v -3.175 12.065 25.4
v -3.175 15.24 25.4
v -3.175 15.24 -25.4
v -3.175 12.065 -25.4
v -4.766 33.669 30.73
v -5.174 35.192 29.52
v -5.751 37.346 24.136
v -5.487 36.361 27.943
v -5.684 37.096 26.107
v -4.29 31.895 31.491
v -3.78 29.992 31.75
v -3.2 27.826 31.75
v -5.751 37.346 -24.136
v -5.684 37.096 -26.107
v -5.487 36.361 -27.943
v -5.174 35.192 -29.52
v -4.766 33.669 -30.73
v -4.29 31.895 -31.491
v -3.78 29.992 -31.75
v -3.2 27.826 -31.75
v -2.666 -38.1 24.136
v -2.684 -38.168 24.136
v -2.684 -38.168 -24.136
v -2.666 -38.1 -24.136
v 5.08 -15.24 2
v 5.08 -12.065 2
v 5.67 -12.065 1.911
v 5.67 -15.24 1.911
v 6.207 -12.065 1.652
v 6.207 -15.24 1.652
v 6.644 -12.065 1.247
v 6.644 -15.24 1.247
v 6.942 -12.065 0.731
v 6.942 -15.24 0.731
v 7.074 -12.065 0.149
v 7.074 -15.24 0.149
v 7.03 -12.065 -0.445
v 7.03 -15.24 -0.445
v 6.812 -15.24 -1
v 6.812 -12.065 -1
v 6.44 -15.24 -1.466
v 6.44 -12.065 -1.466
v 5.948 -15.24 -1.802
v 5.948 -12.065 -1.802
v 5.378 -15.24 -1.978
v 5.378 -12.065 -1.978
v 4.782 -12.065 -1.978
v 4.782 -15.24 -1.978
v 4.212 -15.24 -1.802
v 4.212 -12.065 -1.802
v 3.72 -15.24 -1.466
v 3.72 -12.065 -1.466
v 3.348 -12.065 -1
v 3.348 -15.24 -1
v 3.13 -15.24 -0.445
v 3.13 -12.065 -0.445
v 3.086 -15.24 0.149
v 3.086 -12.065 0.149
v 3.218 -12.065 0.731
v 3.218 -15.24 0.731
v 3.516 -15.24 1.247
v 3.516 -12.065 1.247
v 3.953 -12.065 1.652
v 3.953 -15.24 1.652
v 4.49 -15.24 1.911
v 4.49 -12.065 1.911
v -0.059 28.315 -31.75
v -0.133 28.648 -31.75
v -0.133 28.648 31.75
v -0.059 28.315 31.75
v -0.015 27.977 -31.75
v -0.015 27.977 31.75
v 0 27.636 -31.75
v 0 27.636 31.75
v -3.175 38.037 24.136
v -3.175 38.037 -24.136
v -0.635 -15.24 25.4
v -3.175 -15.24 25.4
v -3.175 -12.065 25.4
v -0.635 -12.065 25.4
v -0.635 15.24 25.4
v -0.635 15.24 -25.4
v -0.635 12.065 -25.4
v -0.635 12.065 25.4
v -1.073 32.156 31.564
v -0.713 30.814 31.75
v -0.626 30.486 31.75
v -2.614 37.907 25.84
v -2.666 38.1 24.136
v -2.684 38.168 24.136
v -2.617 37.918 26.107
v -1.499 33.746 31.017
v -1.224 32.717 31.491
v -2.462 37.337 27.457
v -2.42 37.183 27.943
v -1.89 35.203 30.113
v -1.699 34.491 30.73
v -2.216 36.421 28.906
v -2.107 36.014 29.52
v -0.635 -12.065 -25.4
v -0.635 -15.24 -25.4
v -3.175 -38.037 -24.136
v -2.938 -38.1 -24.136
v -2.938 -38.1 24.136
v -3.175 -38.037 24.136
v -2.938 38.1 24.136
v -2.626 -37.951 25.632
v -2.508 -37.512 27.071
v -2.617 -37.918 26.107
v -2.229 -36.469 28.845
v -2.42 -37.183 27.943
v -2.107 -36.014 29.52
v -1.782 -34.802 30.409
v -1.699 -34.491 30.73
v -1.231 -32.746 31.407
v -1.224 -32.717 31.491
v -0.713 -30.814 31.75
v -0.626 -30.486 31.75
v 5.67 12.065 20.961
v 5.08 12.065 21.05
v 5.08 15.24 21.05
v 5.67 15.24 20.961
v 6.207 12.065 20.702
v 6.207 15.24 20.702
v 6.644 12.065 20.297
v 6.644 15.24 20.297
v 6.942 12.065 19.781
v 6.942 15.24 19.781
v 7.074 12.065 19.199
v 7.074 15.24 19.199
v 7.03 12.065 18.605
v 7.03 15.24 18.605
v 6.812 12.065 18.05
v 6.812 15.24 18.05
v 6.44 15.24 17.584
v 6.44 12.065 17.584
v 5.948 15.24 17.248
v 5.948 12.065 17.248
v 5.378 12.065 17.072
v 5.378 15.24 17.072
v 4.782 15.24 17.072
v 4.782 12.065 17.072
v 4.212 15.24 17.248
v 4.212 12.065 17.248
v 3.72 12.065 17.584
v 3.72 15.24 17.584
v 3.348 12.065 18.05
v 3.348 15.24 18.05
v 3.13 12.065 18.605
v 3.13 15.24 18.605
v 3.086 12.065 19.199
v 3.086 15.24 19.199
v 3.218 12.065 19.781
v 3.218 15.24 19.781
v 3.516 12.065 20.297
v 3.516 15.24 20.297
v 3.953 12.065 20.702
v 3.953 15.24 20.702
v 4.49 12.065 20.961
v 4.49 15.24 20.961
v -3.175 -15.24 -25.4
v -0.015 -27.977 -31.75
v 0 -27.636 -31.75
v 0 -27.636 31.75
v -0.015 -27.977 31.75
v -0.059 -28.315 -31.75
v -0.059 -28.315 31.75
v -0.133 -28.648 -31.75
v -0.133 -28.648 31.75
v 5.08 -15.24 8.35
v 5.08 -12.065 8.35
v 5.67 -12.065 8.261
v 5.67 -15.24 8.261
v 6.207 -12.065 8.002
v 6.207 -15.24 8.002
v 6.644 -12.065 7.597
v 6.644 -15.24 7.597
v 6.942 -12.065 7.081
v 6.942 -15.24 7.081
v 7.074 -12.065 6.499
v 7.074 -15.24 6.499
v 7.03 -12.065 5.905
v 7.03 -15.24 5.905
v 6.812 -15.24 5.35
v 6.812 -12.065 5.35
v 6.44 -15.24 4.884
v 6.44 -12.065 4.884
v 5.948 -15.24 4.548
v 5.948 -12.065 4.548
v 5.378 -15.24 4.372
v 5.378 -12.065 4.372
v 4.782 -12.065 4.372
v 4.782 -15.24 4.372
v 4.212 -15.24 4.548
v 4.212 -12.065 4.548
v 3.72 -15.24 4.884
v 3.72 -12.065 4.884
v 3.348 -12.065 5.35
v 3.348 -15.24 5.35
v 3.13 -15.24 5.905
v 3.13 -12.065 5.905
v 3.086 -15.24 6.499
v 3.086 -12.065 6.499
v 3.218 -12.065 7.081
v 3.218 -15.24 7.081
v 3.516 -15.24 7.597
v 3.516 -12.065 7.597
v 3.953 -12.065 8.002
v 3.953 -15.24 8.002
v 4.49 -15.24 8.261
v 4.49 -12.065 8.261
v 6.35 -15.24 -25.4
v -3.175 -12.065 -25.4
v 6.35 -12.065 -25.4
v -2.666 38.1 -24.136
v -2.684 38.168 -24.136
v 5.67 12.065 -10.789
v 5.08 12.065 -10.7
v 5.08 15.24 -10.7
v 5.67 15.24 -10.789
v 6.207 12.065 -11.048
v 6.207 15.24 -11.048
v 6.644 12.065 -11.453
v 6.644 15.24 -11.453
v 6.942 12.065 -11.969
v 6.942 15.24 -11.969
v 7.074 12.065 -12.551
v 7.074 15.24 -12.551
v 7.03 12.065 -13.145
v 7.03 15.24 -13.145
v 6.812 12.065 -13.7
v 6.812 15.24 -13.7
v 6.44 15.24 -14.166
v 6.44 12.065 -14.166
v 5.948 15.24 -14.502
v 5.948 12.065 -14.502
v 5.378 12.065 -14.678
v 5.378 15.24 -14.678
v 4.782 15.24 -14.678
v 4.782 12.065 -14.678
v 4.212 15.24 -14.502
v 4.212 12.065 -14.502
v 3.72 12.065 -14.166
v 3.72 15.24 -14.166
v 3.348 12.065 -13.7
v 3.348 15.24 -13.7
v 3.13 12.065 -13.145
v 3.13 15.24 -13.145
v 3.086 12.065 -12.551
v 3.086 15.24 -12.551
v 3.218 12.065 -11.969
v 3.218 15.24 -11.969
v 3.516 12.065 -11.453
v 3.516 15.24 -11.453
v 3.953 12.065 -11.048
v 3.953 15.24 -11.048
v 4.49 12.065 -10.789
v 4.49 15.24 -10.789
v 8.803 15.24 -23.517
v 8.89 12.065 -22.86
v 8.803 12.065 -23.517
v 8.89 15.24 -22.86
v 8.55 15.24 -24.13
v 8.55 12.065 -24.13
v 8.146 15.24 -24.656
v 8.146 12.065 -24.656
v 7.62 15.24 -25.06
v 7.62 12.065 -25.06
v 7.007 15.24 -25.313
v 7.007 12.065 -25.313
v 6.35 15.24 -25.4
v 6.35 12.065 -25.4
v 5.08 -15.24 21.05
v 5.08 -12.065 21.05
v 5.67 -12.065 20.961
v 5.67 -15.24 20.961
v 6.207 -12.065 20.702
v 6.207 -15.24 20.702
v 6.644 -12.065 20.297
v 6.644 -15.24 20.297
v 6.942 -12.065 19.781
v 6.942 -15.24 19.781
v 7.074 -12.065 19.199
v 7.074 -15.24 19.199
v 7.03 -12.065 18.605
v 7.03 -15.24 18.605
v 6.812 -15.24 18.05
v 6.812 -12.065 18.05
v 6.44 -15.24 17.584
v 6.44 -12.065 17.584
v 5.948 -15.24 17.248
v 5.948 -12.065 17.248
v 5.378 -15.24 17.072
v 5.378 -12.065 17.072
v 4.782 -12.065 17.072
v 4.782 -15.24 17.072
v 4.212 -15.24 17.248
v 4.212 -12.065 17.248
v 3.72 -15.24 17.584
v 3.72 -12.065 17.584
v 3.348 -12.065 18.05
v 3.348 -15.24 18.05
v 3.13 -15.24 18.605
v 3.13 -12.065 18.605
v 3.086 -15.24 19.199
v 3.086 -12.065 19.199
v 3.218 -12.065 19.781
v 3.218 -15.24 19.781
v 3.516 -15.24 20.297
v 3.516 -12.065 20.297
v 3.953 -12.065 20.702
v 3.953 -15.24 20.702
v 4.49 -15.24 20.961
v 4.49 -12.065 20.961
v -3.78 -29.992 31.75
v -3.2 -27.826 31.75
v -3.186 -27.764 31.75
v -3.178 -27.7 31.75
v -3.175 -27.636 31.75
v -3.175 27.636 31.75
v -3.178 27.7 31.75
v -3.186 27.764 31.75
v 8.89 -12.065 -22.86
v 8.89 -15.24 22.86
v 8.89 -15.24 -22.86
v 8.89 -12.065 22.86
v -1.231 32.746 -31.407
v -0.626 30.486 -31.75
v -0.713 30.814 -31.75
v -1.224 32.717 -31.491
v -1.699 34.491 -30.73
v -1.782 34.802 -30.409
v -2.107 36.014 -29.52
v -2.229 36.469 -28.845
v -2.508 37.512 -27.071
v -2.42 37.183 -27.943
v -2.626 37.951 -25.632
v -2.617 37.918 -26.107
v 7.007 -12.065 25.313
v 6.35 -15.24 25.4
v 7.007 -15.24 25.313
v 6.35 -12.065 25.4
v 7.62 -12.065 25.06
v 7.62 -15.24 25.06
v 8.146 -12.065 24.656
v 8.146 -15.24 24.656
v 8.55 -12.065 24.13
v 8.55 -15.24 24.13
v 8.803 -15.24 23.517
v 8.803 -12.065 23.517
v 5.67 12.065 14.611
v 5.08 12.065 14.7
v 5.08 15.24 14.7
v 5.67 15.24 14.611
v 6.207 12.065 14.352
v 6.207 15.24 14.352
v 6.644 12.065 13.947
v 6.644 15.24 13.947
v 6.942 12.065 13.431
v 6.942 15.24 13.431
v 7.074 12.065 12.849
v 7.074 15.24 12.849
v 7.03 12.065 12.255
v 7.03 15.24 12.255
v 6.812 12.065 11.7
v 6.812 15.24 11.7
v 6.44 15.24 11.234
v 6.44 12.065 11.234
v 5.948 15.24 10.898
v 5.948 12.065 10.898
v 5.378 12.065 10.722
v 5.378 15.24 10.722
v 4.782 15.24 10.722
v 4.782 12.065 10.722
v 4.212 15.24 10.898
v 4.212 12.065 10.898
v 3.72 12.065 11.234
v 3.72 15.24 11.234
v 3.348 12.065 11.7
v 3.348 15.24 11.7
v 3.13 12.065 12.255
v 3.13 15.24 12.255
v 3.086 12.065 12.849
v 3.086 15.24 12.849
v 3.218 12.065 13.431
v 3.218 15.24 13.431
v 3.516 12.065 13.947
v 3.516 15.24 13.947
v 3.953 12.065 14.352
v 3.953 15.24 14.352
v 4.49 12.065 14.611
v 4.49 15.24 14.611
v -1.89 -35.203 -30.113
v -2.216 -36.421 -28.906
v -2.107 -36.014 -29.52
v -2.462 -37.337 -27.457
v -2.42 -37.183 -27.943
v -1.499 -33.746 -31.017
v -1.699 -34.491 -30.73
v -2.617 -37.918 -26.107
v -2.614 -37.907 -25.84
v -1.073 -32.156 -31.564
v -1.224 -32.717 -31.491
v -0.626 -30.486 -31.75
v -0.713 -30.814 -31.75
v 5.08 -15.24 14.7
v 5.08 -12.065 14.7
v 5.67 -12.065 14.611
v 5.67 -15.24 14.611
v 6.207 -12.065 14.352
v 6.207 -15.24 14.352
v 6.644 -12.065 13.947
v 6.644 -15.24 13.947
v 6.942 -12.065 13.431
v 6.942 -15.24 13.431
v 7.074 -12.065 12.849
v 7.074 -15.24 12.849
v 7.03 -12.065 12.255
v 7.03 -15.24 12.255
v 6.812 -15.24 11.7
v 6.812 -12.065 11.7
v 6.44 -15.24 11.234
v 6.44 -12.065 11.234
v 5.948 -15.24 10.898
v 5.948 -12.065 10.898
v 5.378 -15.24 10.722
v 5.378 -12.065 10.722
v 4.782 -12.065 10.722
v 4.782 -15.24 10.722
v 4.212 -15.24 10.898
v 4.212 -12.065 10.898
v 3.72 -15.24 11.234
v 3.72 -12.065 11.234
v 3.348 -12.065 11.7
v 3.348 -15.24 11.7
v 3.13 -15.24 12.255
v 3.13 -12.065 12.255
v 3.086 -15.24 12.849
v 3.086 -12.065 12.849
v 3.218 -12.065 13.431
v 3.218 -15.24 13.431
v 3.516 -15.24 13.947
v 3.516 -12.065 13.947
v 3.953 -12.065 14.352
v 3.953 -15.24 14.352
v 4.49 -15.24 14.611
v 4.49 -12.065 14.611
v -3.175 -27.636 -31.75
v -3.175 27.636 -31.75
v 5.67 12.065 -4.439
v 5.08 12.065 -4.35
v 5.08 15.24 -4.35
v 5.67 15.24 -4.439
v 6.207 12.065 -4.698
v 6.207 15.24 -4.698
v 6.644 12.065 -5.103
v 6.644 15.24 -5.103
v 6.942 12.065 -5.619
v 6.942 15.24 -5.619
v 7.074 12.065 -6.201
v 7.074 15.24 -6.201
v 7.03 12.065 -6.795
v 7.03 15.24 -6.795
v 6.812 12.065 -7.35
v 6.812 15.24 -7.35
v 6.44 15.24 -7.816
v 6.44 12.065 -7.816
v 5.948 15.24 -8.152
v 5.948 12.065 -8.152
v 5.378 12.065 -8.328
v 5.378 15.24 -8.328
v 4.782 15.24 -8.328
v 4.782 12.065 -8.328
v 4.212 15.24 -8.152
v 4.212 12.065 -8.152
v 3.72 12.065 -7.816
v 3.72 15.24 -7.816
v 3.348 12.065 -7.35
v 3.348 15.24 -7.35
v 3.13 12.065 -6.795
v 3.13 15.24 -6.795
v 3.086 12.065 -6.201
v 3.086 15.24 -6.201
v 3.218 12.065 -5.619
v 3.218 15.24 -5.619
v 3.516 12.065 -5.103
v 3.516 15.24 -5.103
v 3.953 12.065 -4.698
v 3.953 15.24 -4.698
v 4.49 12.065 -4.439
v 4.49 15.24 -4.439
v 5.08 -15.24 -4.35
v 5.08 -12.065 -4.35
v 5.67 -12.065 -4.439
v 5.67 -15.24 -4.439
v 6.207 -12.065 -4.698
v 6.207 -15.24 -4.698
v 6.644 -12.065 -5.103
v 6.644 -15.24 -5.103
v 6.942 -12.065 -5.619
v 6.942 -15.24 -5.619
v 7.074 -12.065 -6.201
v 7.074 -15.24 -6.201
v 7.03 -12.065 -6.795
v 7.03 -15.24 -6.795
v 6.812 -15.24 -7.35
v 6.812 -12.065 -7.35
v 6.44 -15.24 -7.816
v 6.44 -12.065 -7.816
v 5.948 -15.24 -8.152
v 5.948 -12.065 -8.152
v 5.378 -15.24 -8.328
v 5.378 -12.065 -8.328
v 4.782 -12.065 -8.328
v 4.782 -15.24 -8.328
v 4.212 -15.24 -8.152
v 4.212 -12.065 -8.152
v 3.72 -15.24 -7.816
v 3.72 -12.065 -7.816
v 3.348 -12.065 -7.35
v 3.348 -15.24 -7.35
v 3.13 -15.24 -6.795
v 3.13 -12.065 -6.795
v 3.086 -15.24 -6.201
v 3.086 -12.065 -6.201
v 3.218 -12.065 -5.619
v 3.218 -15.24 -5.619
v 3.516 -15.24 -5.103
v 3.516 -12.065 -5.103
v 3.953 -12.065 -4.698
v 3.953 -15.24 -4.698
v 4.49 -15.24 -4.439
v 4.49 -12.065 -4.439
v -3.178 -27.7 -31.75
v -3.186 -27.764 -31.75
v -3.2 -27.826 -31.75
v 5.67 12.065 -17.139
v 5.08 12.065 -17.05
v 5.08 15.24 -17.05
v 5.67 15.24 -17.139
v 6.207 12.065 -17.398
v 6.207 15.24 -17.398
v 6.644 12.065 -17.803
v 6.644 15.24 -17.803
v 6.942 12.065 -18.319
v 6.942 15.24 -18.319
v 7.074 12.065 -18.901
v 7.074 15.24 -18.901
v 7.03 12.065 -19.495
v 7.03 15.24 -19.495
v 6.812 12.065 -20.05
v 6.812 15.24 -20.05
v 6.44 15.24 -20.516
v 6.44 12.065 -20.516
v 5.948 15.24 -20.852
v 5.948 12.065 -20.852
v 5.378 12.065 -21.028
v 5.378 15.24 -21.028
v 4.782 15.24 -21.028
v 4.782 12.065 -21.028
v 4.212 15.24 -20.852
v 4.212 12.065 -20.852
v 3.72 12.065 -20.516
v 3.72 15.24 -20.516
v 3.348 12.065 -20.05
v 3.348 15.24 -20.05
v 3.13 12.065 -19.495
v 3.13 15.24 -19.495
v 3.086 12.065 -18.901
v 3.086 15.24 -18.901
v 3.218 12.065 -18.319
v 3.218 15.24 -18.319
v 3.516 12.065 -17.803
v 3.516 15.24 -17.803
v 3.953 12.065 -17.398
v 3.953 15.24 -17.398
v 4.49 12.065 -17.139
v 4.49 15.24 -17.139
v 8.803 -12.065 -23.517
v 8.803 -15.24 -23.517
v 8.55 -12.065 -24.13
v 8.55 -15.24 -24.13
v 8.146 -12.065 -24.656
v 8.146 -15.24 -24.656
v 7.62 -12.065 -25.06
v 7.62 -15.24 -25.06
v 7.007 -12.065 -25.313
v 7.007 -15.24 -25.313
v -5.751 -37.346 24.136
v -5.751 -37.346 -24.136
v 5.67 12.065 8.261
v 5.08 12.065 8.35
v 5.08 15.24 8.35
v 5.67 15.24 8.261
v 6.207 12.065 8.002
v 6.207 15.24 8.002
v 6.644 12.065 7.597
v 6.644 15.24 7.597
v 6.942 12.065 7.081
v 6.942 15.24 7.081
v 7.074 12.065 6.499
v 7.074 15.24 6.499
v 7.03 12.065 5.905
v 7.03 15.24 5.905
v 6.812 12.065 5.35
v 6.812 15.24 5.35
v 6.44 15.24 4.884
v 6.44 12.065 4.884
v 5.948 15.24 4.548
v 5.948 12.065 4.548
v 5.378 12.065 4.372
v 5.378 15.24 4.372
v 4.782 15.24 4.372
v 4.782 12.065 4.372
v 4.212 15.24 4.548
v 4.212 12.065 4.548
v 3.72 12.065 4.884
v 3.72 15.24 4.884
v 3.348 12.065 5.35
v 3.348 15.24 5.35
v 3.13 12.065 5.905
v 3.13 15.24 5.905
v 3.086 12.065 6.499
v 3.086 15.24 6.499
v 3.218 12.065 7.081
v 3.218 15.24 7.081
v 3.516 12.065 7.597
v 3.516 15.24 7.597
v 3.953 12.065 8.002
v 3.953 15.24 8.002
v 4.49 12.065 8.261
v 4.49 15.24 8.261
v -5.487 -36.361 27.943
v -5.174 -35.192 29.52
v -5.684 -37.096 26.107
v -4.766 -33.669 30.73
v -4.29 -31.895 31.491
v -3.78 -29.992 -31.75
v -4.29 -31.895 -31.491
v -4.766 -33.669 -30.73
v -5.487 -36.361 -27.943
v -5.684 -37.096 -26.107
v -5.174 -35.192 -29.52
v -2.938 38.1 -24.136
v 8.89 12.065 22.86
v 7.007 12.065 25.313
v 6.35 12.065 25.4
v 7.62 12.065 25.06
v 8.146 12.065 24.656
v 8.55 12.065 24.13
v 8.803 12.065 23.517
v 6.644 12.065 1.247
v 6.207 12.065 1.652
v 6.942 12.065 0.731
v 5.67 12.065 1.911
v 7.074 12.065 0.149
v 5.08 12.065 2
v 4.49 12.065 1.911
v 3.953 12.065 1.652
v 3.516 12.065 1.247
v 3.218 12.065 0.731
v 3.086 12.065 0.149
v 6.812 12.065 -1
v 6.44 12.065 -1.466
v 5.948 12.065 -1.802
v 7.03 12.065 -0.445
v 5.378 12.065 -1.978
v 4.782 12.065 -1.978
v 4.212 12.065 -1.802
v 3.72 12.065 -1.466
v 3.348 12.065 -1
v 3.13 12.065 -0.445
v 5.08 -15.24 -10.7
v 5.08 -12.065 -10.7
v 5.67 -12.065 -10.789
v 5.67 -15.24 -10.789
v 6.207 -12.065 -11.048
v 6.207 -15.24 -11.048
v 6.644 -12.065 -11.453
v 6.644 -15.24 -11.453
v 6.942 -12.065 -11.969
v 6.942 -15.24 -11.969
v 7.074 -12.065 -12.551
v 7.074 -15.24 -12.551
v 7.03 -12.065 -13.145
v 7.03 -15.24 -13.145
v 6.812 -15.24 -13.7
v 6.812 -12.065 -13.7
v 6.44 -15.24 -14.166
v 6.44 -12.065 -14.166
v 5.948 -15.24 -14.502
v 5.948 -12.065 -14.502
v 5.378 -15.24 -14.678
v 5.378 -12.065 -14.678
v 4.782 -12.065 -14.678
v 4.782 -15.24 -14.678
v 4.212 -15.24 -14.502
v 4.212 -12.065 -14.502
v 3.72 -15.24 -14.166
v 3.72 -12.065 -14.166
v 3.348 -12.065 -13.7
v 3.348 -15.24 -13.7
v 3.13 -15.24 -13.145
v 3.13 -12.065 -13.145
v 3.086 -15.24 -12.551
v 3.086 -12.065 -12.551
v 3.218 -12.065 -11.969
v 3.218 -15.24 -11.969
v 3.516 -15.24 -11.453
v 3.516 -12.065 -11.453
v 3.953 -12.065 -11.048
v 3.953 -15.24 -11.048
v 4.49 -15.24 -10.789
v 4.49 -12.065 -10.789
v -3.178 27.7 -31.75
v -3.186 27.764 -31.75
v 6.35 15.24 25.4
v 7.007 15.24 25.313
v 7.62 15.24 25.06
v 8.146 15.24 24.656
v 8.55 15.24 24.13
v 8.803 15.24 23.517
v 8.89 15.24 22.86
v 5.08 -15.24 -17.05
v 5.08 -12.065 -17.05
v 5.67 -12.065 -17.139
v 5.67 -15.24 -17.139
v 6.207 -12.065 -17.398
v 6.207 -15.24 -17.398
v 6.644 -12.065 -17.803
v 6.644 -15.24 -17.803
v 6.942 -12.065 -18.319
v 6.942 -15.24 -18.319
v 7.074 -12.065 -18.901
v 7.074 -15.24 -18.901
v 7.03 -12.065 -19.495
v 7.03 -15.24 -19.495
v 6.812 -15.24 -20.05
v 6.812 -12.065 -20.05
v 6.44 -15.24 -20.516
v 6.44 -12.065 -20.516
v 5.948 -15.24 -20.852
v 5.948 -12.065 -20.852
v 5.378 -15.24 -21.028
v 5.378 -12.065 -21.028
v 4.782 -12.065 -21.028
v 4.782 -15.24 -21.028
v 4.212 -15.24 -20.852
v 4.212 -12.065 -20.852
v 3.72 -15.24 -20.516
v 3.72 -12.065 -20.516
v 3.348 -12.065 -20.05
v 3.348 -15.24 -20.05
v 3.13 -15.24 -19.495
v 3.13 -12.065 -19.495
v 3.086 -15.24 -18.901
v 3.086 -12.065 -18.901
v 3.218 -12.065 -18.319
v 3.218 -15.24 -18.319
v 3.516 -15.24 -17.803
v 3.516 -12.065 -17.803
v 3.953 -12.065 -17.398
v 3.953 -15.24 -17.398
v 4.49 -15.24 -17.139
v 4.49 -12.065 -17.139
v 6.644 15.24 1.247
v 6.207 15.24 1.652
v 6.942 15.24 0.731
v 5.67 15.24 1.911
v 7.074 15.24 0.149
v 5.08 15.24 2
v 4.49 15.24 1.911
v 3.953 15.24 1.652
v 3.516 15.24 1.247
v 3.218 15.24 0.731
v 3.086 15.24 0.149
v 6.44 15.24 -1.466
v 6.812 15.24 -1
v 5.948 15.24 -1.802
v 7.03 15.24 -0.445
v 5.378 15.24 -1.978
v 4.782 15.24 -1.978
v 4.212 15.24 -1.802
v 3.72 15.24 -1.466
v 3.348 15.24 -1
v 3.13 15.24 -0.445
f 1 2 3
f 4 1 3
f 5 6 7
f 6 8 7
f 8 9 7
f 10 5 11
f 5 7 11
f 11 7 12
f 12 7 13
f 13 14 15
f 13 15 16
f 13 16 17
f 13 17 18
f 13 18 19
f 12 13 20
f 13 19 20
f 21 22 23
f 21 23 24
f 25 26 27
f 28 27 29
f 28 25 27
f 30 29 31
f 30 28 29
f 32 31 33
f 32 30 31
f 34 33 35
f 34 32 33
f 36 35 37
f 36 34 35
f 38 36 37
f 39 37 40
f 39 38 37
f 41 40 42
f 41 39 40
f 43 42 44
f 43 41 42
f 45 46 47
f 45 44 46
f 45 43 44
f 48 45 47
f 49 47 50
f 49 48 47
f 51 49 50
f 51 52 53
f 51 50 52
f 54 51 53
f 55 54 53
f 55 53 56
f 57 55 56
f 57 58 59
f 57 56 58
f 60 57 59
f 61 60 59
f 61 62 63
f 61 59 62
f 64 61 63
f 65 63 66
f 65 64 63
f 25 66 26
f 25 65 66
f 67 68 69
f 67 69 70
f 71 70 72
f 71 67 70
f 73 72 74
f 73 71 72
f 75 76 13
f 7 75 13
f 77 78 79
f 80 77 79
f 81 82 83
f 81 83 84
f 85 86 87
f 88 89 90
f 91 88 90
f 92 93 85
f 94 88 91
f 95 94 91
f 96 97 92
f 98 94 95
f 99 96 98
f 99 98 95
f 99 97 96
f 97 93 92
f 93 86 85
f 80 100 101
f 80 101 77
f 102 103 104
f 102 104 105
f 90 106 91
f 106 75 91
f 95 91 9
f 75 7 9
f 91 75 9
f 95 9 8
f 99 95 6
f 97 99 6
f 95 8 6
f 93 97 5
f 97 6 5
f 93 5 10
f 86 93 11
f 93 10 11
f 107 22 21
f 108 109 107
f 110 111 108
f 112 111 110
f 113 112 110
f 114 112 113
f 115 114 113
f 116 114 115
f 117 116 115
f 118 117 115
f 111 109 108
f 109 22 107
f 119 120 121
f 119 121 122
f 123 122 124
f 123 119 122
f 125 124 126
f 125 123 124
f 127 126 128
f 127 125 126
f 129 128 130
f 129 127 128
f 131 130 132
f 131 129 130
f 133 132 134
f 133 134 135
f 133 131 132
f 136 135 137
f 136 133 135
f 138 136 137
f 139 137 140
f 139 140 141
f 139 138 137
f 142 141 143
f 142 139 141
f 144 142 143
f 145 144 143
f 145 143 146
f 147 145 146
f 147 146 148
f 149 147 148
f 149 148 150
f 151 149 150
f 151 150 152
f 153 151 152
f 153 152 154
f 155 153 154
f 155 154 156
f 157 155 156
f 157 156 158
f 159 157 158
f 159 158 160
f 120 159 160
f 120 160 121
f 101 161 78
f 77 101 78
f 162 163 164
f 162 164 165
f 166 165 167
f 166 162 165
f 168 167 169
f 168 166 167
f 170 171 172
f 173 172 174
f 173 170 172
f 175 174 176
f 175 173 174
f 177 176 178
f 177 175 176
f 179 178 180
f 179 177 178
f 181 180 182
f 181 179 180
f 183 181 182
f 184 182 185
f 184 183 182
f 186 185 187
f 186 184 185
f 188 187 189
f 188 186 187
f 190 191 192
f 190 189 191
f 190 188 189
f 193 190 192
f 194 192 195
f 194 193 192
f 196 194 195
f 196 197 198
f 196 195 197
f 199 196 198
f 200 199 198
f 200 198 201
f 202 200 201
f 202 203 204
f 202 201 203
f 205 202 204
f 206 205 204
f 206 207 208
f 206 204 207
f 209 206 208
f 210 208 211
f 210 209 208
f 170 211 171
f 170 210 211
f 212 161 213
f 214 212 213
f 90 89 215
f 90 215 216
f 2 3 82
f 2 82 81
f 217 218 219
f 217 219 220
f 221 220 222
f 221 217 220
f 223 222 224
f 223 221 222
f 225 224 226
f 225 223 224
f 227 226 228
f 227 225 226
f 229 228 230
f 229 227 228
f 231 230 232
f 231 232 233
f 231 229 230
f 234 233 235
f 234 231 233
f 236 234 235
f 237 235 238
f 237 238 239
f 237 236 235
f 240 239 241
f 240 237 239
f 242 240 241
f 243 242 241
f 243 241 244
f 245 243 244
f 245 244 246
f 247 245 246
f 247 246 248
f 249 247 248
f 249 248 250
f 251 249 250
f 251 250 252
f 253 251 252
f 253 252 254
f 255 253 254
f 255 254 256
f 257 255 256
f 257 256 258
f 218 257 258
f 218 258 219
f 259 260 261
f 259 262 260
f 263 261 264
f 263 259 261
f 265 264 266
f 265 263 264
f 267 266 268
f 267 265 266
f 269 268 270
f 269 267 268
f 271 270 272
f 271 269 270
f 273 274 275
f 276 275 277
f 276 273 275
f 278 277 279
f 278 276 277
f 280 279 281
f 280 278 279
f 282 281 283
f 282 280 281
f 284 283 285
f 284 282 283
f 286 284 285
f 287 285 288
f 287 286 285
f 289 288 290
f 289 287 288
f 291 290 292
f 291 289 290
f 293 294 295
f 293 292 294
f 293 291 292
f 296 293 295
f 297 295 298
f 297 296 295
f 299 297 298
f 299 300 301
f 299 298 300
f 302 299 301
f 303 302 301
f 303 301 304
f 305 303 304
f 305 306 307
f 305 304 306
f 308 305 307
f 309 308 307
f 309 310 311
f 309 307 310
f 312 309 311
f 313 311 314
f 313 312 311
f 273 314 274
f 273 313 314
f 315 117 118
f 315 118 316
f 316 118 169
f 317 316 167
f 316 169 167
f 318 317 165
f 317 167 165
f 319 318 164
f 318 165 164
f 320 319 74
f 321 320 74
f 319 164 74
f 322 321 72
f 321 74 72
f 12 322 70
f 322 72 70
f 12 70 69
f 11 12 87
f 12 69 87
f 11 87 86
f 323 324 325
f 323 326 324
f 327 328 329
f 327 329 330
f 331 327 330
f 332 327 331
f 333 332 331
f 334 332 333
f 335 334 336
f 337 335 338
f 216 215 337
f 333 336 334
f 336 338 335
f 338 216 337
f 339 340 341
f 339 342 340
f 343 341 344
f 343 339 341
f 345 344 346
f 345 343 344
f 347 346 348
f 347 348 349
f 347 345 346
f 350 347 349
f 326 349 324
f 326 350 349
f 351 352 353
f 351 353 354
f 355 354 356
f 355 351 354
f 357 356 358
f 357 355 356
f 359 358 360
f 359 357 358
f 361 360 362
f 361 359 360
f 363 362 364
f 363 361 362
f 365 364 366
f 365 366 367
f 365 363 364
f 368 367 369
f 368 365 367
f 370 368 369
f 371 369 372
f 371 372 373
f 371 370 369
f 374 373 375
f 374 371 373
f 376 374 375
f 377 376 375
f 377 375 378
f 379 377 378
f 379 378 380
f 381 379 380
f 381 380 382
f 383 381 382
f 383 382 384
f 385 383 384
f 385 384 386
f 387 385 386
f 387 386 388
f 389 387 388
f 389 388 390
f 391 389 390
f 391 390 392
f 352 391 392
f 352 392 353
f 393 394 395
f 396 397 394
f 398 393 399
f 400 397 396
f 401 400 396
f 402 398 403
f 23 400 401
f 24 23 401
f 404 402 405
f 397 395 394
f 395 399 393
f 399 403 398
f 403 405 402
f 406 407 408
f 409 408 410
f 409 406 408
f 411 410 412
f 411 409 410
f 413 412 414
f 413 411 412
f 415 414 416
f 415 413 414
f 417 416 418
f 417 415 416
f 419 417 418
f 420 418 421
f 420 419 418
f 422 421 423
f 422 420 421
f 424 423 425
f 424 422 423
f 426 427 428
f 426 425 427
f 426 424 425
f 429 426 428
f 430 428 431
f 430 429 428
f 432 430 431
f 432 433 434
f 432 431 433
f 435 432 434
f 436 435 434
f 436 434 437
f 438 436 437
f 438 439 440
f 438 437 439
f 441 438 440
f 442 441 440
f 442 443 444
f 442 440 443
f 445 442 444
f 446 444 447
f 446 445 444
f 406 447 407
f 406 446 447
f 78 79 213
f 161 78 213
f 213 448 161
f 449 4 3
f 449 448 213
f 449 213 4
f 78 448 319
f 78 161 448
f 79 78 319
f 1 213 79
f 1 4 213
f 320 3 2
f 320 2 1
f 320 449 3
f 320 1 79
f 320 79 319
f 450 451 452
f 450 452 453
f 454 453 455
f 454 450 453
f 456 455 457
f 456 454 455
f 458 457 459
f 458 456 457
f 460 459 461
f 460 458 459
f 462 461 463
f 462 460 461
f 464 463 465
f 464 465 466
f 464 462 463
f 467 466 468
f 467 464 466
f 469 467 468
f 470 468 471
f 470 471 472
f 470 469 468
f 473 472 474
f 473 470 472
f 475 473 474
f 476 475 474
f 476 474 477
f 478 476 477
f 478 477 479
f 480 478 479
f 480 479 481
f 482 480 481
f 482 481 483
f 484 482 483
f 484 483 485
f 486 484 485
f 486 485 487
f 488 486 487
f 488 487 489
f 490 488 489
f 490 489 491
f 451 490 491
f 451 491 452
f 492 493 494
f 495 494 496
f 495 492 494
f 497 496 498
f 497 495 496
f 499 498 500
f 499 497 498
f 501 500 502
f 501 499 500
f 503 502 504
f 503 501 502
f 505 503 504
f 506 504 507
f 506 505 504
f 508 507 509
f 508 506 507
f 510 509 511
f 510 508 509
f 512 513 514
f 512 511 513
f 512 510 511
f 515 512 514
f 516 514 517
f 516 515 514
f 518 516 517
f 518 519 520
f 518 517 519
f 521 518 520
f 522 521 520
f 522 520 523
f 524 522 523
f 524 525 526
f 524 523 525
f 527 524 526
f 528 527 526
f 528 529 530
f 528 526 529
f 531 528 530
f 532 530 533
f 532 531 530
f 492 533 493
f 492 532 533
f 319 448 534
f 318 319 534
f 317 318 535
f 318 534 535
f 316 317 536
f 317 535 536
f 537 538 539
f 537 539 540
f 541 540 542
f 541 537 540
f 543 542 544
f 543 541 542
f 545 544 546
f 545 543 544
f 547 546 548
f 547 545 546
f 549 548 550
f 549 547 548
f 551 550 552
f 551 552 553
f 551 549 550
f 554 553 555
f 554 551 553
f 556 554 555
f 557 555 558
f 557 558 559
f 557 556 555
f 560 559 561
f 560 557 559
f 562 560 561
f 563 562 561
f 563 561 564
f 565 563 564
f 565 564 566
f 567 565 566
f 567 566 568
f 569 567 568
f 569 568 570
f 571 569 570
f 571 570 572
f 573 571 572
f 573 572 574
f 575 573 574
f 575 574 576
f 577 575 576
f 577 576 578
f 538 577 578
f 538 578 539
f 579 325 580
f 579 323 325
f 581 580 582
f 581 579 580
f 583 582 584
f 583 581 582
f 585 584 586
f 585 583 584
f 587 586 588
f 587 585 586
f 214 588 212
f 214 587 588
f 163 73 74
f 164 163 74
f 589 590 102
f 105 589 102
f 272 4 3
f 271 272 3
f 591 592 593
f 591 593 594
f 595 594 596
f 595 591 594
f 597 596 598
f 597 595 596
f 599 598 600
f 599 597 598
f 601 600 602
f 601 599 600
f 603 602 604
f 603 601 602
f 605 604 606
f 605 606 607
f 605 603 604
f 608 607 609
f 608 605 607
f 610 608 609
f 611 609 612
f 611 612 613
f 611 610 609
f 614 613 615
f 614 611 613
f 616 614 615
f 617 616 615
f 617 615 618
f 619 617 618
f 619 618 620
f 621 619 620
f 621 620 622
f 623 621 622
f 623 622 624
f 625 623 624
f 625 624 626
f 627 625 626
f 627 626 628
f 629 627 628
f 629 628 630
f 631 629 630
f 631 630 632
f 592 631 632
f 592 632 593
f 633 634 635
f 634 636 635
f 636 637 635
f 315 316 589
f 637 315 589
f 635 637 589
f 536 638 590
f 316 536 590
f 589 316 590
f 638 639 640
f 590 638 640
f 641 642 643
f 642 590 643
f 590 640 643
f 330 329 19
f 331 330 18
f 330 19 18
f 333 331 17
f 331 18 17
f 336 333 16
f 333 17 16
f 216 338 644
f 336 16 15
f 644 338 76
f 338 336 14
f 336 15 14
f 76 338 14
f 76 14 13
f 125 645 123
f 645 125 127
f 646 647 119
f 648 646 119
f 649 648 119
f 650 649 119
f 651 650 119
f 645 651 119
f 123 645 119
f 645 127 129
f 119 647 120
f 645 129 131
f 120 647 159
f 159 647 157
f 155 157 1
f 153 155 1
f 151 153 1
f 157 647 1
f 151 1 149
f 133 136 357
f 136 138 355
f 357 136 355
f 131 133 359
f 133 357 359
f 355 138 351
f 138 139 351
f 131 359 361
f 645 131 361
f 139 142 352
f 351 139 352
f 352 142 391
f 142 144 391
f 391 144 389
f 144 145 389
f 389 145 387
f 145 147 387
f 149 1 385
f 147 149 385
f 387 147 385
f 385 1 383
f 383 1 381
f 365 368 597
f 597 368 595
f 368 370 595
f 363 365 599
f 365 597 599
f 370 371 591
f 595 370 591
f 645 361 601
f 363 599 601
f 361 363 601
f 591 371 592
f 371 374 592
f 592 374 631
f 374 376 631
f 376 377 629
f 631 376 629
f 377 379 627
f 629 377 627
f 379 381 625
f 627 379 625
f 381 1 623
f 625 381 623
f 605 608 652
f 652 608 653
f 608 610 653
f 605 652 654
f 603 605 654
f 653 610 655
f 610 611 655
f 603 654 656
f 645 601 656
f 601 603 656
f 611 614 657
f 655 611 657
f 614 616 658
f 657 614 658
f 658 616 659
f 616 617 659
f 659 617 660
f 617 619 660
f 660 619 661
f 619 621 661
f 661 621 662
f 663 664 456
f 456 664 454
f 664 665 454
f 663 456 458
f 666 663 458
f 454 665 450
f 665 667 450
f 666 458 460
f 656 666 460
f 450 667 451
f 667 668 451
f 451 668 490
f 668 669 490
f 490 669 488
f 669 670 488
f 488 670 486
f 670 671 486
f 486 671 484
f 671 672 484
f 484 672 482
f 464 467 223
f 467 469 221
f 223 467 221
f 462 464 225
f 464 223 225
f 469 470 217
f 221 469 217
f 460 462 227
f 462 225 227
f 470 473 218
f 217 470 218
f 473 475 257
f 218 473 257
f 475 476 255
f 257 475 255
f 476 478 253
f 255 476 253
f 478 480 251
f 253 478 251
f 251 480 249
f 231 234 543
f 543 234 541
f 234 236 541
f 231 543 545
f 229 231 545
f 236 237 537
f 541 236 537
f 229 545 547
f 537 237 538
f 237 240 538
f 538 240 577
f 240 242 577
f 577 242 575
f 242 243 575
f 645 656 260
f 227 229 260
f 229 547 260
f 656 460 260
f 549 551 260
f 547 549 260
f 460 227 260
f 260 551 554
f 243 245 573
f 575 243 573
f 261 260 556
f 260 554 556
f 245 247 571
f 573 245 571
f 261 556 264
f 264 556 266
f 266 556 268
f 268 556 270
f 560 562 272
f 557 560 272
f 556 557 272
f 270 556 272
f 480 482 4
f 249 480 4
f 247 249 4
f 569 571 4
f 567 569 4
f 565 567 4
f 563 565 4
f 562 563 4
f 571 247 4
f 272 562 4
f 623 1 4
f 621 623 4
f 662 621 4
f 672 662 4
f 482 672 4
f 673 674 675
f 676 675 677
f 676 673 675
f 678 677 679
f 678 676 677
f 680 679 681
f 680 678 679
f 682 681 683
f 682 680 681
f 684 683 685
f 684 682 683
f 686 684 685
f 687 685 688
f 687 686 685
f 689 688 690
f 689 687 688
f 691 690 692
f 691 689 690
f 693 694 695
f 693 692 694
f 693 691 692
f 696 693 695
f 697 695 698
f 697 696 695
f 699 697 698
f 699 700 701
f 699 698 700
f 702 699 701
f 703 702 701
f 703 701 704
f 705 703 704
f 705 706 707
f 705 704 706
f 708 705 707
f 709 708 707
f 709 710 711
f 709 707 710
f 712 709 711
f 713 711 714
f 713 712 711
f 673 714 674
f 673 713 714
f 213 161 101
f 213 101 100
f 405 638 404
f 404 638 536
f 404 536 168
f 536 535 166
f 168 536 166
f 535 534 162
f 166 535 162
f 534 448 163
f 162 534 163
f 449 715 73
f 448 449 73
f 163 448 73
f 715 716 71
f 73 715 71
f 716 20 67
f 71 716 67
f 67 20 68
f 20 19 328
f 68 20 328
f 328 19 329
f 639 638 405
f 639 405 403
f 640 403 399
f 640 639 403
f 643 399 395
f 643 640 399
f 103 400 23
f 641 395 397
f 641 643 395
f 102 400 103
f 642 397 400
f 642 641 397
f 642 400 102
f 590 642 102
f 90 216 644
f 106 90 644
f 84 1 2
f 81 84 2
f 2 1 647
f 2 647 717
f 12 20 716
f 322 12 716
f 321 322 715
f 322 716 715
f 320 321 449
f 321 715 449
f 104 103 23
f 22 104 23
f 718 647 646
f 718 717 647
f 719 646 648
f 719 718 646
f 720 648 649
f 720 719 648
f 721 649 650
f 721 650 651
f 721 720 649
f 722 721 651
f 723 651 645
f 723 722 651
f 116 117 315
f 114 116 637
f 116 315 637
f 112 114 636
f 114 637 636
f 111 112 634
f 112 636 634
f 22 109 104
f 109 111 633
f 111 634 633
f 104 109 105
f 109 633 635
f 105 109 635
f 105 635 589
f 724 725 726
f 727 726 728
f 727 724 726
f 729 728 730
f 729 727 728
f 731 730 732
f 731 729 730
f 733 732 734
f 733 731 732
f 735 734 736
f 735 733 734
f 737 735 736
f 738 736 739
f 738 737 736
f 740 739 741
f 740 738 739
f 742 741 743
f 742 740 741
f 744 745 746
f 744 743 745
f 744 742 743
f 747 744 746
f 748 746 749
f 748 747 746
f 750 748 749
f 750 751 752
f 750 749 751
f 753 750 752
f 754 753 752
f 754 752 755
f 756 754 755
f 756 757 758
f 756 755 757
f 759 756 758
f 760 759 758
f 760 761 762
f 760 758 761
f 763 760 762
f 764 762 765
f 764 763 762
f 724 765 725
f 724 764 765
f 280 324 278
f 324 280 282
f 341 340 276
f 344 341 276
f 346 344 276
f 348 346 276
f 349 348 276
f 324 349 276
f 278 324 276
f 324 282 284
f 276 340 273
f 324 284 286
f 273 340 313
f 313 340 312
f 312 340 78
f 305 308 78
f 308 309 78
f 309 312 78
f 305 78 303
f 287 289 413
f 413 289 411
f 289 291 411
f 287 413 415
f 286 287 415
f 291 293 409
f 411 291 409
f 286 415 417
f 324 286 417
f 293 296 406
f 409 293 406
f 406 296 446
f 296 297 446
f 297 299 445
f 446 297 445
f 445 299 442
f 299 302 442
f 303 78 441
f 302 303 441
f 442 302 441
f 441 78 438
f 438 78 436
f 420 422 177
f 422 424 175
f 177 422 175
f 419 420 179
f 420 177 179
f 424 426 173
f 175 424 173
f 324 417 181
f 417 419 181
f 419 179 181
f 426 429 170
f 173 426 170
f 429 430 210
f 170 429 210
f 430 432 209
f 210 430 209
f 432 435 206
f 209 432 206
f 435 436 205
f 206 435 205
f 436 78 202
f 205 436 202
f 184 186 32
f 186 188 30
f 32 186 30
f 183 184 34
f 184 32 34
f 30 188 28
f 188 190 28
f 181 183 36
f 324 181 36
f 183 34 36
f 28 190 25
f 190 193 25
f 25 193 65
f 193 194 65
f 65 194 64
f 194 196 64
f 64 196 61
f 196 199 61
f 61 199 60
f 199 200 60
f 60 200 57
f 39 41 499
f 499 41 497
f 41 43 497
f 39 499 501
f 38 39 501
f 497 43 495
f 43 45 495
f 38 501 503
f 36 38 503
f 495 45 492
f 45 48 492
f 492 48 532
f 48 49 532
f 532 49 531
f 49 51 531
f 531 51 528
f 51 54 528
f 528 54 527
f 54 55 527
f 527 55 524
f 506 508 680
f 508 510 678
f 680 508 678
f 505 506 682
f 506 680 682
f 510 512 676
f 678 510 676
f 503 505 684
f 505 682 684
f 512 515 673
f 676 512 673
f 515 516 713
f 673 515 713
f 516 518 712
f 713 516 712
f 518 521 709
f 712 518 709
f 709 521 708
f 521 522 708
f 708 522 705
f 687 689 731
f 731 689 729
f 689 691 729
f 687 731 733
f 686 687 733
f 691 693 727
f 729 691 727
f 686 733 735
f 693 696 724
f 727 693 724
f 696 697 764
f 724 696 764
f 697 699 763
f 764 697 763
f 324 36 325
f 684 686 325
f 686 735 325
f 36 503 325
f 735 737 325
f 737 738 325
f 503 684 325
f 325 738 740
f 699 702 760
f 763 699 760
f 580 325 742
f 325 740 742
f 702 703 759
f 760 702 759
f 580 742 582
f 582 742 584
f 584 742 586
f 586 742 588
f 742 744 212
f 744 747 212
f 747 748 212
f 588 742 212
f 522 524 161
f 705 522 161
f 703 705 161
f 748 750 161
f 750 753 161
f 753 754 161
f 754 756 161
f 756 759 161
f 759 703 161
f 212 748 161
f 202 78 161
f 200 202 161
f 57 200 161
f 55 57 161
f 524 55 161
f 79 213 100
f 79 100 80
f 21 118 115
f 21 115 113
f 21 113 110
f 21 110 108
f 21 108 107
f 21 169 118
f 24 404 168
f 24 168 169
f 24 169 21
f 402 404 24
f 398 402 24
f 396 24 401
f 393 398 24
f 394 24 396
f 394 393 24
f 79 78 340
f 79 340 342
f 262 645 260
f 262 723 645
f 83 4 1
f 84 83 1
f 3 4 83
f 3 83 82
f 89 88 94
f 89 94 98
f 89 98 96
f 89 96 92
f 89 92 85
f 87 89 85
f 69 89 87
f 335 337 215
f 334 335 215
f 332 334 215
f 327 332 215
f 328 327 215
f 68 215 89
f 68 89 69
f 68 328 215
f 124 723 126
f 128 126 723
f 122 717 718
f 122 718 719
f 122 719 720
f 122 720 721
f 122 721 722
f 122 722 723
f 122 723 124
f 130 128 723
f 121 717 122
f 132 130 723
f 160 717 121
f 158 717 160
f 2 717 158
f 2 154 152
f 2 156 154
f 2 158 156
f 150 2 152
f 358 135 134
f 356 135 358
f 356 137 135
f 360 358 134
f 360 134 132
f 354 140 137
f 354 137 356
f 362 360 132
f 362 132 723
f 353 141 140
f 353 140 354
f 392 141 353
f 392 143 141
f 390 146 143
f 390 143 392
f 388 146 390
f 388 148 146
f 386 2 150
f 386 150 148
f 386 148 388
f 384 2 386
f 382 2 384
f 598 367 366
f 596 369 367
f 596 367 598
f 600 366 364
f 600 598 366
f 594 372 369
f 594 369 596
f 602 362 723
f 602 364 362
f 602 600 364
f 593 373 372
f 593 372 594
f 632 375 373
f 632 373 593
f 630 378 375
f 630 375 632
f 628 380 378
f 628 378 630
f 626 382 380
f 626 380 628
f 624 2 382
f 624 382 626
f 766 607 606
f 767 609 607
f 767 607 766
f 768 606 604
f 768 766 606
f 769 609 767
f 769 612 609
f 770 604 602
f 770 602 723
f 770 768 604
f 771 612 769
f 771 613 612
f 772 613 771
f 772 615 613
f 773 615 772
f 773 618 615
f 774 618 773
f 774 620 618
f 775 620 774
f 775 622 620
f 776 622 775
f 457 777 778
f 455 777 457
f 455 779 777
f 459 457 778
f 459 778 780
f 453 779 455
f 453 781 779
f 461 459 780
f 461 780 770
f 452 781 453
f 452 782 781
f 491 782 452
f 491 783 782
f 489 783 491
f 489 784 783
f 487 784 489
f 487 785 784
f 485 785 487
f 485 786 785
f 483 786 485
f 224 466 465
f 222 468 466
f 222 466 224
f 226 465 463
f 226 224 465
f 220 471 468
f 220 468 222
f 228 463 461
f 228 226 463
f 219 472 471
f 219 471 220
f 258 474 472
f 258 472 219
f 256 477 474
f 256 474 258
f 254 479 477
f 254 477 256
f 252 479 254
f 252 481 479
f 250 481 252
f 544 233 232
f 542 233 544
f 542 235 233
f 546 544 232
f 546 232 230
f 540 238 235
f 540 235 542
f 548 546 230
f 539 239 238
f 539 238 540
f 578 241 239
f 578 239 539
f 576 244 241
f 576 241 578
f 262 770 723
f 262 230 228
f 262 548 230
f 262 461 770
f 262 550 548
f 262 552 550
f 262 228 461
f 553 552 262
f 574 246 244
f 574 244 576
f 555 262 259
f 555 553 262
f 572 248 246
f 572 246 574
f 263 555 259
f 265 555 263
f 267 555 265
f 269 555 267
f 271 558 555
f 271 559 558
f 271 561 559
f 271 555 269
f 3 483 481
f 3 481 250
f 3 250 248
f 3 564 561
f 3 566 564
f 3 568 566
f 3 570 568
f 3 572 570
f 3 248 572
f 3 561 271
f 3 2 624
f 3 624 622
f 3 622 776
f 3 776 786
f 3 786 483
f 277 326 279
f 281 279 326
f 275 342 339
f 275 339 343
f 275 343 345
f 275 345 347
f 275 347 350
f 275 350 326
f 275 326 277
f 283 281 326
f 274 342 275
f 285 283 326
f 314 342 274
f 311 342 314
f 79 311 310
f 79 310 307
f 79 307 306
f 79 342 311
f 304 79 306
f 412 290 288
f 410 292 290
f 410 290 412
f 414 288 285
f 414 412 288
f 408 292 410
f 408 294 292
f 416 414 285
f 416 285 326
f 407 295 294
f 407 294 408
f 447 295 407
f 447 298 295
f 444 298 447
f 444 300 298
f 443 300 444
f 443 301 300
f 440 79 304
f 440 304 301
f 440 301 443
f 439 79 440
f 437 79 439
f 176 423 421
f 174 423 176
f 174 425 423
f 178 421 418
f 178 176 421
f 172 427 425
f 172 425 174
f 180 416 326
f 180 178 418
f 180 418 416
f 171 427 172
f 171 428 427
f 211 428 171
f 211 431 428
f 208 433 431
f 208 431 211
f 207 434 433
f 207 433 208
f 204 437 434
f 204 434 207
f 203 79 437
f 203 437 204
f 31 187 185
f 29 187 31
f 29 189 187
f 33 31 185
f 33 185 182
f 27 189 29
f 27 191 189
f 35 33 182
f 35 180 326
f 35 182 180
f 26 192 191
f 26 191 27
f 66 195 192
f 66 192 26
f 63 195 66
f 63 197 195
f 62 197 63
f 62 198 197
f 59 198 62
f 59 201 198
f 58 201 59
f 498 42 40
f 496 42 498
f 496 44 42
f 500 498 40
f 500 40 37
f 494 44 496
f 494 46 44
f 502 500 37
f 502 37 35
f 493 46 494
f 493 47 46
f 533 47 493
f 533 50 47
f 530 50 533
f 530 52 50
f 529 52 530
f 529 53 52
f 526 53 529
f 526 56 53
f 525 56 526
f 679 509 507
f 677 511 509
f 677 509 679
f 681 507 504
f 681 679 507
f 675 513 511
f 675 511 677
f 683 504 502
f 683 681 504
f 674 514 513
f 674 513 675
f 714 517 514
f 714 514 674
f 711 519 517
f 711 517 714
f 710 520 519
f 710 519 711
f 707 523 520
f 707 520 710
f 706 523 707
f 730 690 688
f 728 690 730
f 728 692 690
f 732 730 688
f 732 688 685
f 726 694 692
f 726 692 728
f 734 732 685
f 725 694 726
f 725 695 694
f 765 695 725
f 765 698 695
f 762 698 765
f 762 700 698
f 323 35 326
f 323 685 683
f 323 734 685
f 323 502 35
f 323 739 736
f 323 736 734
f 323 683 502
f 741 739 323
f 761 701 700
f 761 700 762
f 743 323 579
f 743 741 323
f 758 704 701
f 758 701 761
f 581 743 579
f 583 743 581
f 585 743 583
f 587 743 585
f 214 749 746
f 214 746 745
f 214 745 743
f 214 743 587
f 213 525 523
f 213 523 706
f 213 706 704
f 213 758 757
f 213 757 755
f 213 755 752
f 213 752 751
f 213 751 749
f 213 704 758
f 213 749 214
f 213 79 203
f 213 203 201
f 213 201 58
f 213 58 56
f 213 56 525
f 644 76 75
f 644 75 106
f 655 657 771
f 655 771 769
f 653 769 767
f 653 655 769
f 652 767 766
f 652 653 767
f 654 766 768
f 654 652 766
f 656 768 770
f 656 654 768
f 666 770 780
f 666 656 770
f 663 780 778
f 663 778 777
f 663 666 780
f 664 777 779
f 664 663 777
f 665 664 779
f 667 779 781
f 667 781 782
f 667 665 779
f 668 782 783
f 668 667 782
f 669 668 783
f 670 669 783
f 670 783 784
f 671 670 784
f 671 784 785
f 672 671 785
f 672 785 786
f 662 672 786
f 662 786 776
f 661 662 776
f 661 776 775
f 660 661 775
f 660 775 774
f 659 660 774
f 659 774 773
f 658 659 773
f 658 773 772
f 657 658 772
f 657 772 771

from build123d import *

# Parameters (mm, degrees)
BASE_FLANGE1_DEPTH         = 3.175
SKETCHED_START             = -31.75
SKETCHED_BEND3_DEPTH       = 63.5
SKETCHED_START_2           = -24.135978559
SKETCHED_BEND3_2_DEPTH     = 48.271957118
SKETCHED_BEND3_3_DEPTH     = 63.5
SKETCHED_START_3           = 4.384939983
SKETCHED_BEND3_4_DEPTH     = 2.901009715
SKETCHED_START_4           = 4.370325746
SKETCHED_BEND3_5_DEPTH     = 2.915623952
SKETCHED_START_5           = 3
SKETCHED_BEND3_6_DEPTH     = 4.104292999
SKETCHED_BEND3_7_DEPTH     = 4.285949698
BOSS_EXTRUDE4_DEPTH        = 8.89
BOSS_EXTRUDE4_DEPTH_BACK   = 3.175
SKETCH11_W                 = 50.8
SKETCH11_H                 = 3.175
BOSS_EXTRUDE4_2_DEPTH      = 8.89
BOSS_EXTRUDE4_2_DEPTH_BACK = 3.175
CUT_EXTRUDE1_START         = -30.48
SKETCH14_R                 = 2
CUT_EXTRUDE1_DEPTH         = 30.48
FILLET1_R                  = 2.54
FILLET2_R                  = 2.54
SKETCH15_W                 = 50.8
SKETCH15_H                 = 3.175
CUT_EXTRUDE3_DEPTH         = 2.54


with BuildPart() as part:
    # Base-Flange1: sheet metal written as solids
    # Sketch1 → Base-Flange1 (new body)
    with BuildSketch(Plane(origin=(0, 0, 0), x_dir=(0, 0, -1), z_dir=(1, 0, 0))):
        with BuildLine():
            Line((24.135978559, -38.1), (-24.135978559, -38.1))
            ThreePointArc((-24.135978559, -38.1), (-29.519904752, -35.869904752), (-31.75, -30.485978559))
            Line((-31.75, -30.485978559), (-31.75, 30.485978559))
            ThreePointArc((-31.75, 30.485978559), (-29.519904752, 35.869904752), (-24.135978559, 38.1))
            Line((-24.135978559, 38.1), (24.135978559, 38.1))
            ThreePointArc((24.135978559, 38.1), (29.519904752, 35.869904752), (31.75, 30.485978559))
            Line((31.75, 30.485978559), (31.75, -30.485978559))
            ThreePointArc((31.75, -30.485978559), (29.519904752, -35.869904752), (24.135978559, -38.1))
        make_face()
    extrude(amount=-BASE_FLANGE1_DEPTH)

    # Sketched Bend3: read off the stored shape, not the designer's step
    # Sketched Bend3 outline → Sketched Bend3 (cut)
    with BuildSketch(Plane.XY.offset(SKETCHED_START)):
        Polygon((-2.938378837, -38.1), (-3.175, -38.03659755), (-3.175, -38.1), align=None)
        Polygon((-3.175, 38.1), (-3.175, 38.03659755), (-2.938378837, 38.1), align=None)
        with BuildLine():
            Line((-0.133284538, -28.648172598), (-2.665894057, -38.1))
            Line((-2.665894057, -38.1), (0, -38.1))
            Line((0, -38.1), (0, -27.635776021))
            ThreePointArc((0, -27.635776021), (-0.03346428, -28.146342275), (-0.133284538, -28.648172598))
        make_face()
        with BuildLine():
            Line((0, 38.1), (-2.665894057, 38.1))
            Line((-2.665894057, 38.1), (-0.133284538, 28.648172598))
            ThreePointArc((-0.133284538, 28.648172598), (-0.03346428, 28.146342275), (0, 27.635776021))
            Line((0, 27.635776021), (0, 38.1))
        make_face()
    extrude(amount=SKETCHED_BEND3_DEPTH, mode=Mode.SUBTRACT)

    # Sketched Bend3 2 outline → Sketched Bend3 2 (add)
    with BuildSketch(Plane.XY.offset(SKETCHED_START_2)):
        with BuildLine():
            ThreePointArc((-3.175, -27.635776021), (-3.181301715, -27.731921614), (-3.200099036, -27.82642213))
            Line((-3.200099036, -27.82642213), (-5.750961575, -37.346370727))
            Line((-5.750961575, -37.346370727), (-3.175, -38.03659755))
            Line((-3.175, -38.03659755), (-3.175, -27.635776021))
        make_face()
        with BuildLine():
            ThreePointArc((-3.200099036, 27.82642213), (-3.181301715, 27.731921614), (-3.175, 27.635776021))
            Line((-3.175, 27.635776021), (-3.175, 38.03659755))
            Line((-3.175, 38.03659755), (-5.750961575, 37.346370727))
            Line((-5.750961575, 37.346370727), (-3.200099036, 27.82642213))
        make_face()
        Polygon((-2.665894057, -38.1), (-2.938378837, -38.1), (-2.684147076, -38.168121195), align=None)
        Polygon((-2.684147076, 38.168121195), (-2.938378837, 38.1), (-2.665894057, 38.1), align=None)
    extrude(amount=SKETCHED_BEND3_2_DEPTH)

    # Sketched Bend3 3 outline → Sketched Bend3 3 (add)
    with BuildSketch(Plane.XY.offset(SKETCHED_START)):
        with BuildLine():
            ThreePointArc((-3.200099036, 27.82642213), (-3.181301715, 27.731921614), (-3.175, 27.635776021))
            Line((-3.175, 27.635776021), (-3.175, 38.03659755))
            Line((-3.175, 38.03659755), (-5.750961575, 37.346370727))
            Line((-5.750961575, 37.346370727), (-3.200099036, 27.82642213))
        make_face()
        with BuildLine():
            ThreePointArc((-3.175, -27.635776021), (-3.181301715, -27.731921614), (-3.200099036, -27.82642213))
            Line((-3.200099036, -27.82642213), (-5.750961575, -37.346370727))
            Line((-5.750961575, -37.346370727), (-3.175, -38.03659755))
            Line((-3.175, -38.03659755), (-3.175, -27.635776021))
        make_face()
    extrude(amount=SKETCHED_BEND3_3_DEPTH)

    # Sketched Bend3 4 outline → Sketched Bend3 4 (add)
    with BuildSketch(Plane(origin=(0, 0, 0), x_dir=(0.2588190451025211, 0.9659258262890682, 0), z_dir=(0.9659258262890682, -0.2588190451025211, 0)).offset(SKETCHED_START_3)):
        with BuildLine():
            Line((-28, 31.75), (-29.948260946, 31.75))
            ThreePointArc((-29.948260946, 31.75), (-35.332187139, 29.519904752), (-37.562282387, 24.135978559))
            Line((-37.562282387, 24.135978559), (-28, 24.135978559))
            Line((-28, 24.135978559), (-28, 31.75))
        make_face()
        with BuildLine():
            Line((-28, -24.135978559), (-37.562282387, -24.135978559))
            ThreePointArc((-37.562282387, -24.135978559), (-35.332187139, -29.519904752), (-29.948260946, -31.75))
            Line((-29.948260946, -31.75), (-28, -31.75))
            Line((-28, -31.75), (-28, -24.135978559))
        make_face()
    extrude(amount=SKETCHED_BEND3_4_DEPTH)

    # Sketched Bend3 5 outline → Sketched Bend3 5 (add)
    with BuildSketch(Plane(origin=(0, 0, 0), x_dir=(-0.2588190451025211, 0.9659258262890682, 0), z_dir=(0.9659258262890682, 0.2588190451025211, 0)).offset(SKETCHED_START_4)):
        with BuildLine():
            Line((28, -31.75), (29.948260946, -31.75))
            ThreePointArc((29.948260946, -31.75), (35.332187139, -29.519904752), (37.562282387, -24.135978559))
            Line((37.562282387, -24.135978559), (28, -24.135978559))
            Line((28, -24.135978559), (28, -31.75))
        make_face()
        with BuildLine():
            Line((28, 24.135978559), (37.562282387, 24.135978559))
            ThreePointArc((37.562282387, 24.135978559), (35.332187139, 29.519904752), (29.948260946, 31.75))
            Line((29.948260946, 31.75), (28, 31.75))
            Line((28, 31.75), (28, 24.135978559))
        make_face()
    extrude(amount=SKETCHED_BEND3_5_DEPTH)

    # Sketched Bend3 6 outline → Sketched Bend3 6 (cut)
    with BuildSketch(Plane(origin=(0, 0, 0), x_dir=(0.2588190451025211, 0.9659258262890682, 0), z_dir=(0.9659258262890682, -0.2588190451025211, 0)).offset(SKETCHED_START_5)):
        with BuildLine():
            ThreePointArc((-37.562282387, 24.135978559), (-35.332187139, 29.519904752), (-29.948260946, 31.75))
            Line((-29.948260946, 31.75), (-28, 31.75))
            Line((-28, 31.75), (-28, 33))
            Line((-28, 33), (-37.562282387, 33))
            Line((-37.562282387, 33), (-37.562282387, 24.135978559))
        make_face()
        with BuildLine():
            ThreePointArc((-29.948260946, -31.75), (-35.332187139, -29.519904752), (-37.562282387, -24.135978559))
            Line((-37.562282387, -24.135978559), (-37.562282387, -33))
            Line((-37.562282387, -33), (-28, -33))
            Line((-28, -33), (-28, -31.75))
            Line((-28, -31.75), (-29.948260946, -31.75))
        make_face()
    extrude(amount=SKETCHED_BEND3_6_DEPTH, mode=Mode.SUBTRACT)

    # Sketched Bend3 7 outline → Sketched Bend3 7 (cut)
    with BuildSketch(Plane(origin=(0, 0, 0), x_dir=(-0.2588190451025211, 0.9659258262890682, 0), z_dir=(0.9659258262890682, 0.2588190451025211, 0)).offset(SKETCHED_START_5)):
        with BuildLine():
            ThreePointArc((37.562282387, -24.135978559), (35.332187139, -29.519904752), (29.948260946, -31.75))
            Line((29.948260946, -31.75), (28, -31.75))
            Line((28, -31.75), (28, -33))
            Line((28, -33), (37.562282386, -33))
            Line((37.562282386, -33), (37.562282387, -24.135978559))
        make_face()
        with BuildLine():
            ThreePointArc((29.948260946, 31.75), (35.332187139, 29.519904752), (37.562282387, 24.135978559))
            Line((37.562282387, 24.135978559), (37.562282386, 33))
            Line((37.562282386, 33), (28, 33))
            Line((28, 33), (28, 31.75))
            Line((28, 31.75), (29.948260946, 31.75))
        make_face()
    extrude(amount=SKETCHED_BEND3_7_DEPTH, mode=Mode.SUBTRACT)

    # Sketch15 → Cut-Extrude3 (cut)
    with BuildSketch(Plane.ZY.offset(3.175)):
        with Locations((0, 13.6525)):
            Rectangle(SKETCH15_W, SKETCH15_H)
        with Locations((0, -13.6525)):
            Rectangle(SKETCH15_W, SKETCH15_H)
    extrude(amount=-CUT_EXTRUDE3_DEPTH, mode=Mode.SUBTRACT)


with BuildPart() as body_2:
    # Sketch11 → Boss-Extrude4 (new, two sides: drawn at the far end of the back side and taken through both)
    with BuildSketch(Plane(origin=(0, 0, 0), x_dir=(0, 0, -1), z_dir=(1, 0, 0)).offset(-BOSS_EXTRUDE4_DEPTH_BACK)):
        with Locations((0, -13.6525)):
            Rectangle(SKETCH11_W, SKETCH11_H)
    extrude(amount=BOSS_EXTRUDE4_DEPTH + BOSS_EXTRUDE4_DEPTH_BACK)


with BuildPart() as body_3:
    # Sketch11 → Boss-Extrude4 2 (new, two sides: drawn at the far end of the back side and taken through both)
    with BuildSketch(Plane(origin=(0, 0, 0), x_dir=(0, 0, -1), z_dir=(1, 0, 0)).offset(-BOSS_EXTRUDE4_2_DEPTH_BACK)):
        with Locations((0, 13.6525)):
            Rectangle(SKETCH11_W, SKETCH11_H)
    extrude(amount=BOSS_EXTRUDE4_2_DEPTH + BOSS_EXTRUDE4_2_DEPTH_BACK)


with BuildPart() as cut_extrude1_tool:
    # Sketch14 → Cut-Extrude1 (new body)
    with BuildSketch(Plane(origin=(0, 15.24, 0), x_dir=(1, 0, 0), z_dir=(0, 1, 0)).offset(CUT_EXTRUDE1_START)):
        with Locations(Location((5.08, -12.7, 0), (0, 0, 270))):
            Circle(SKETCH14_R)
        with Locations(Location((5.08, -6.35, 0), (0, 0, 270))):
            Circle(SKETCH14_R)
        with Locations(Location((5.08, 0, 0), (0, 0, 270))):
            Circle(SKETCH14_R)
        with Locations(Location((5.08, 6.35, 0), (0, 0, 270))):
            Circle(SKETCH14_R)
        with Locations(Location((5.08, 12.7, 0), (0, 0, 270))):
            Circle(SKETCH14_R)
        with Locations(Location((5.08, -19.05, 0), (0, 0, 270))):
            Circle(SKETCH14_R)
        with Locations(Location((5.08, 19.05, 0), (0, 0, 270))):
            Circle(SKETCH14_R)
    extrude(amount=CUT_EXTRUDE1_DEPTH)


with BuildPart() as body_2_1:
    add(body_2.part)

    # Cut-Extrude1: cut by cut_extrude1_tool
    add(cut_extrude1_tool.part, mode=Mode.SUBTRACT)

    # Fillet1
    fillet1_edges = [body_2_1.edges().sort_by_distance(p)[0] for p in [
        (8.89, -13.6525, 25.4),
        (8.89, -13.6525, -25.4),
    ]]
    fillet(fillet1_edges, radius=FILLET1_R)


with BuildPart() as body_3_1:
    add(body_3.part)

    # Cut-Extrude1: cut by cut_extrude1_tool
    add(cut_extrude1_tool.part, mode=Mode.SUBTRACT)

    # Fillet2
    fillet2_edges = [body_3_1.edges().sort_by_distance(p)[0] for p in [
        (8.89, 13.6525, 25.4),
        (8.89, 13.6525, -25.4),
    ]]
    fillet(fillet2_edges, radius=FILLET2_R)


solid = Compound([part.part, body_2_1.part, body_3_1.part])
